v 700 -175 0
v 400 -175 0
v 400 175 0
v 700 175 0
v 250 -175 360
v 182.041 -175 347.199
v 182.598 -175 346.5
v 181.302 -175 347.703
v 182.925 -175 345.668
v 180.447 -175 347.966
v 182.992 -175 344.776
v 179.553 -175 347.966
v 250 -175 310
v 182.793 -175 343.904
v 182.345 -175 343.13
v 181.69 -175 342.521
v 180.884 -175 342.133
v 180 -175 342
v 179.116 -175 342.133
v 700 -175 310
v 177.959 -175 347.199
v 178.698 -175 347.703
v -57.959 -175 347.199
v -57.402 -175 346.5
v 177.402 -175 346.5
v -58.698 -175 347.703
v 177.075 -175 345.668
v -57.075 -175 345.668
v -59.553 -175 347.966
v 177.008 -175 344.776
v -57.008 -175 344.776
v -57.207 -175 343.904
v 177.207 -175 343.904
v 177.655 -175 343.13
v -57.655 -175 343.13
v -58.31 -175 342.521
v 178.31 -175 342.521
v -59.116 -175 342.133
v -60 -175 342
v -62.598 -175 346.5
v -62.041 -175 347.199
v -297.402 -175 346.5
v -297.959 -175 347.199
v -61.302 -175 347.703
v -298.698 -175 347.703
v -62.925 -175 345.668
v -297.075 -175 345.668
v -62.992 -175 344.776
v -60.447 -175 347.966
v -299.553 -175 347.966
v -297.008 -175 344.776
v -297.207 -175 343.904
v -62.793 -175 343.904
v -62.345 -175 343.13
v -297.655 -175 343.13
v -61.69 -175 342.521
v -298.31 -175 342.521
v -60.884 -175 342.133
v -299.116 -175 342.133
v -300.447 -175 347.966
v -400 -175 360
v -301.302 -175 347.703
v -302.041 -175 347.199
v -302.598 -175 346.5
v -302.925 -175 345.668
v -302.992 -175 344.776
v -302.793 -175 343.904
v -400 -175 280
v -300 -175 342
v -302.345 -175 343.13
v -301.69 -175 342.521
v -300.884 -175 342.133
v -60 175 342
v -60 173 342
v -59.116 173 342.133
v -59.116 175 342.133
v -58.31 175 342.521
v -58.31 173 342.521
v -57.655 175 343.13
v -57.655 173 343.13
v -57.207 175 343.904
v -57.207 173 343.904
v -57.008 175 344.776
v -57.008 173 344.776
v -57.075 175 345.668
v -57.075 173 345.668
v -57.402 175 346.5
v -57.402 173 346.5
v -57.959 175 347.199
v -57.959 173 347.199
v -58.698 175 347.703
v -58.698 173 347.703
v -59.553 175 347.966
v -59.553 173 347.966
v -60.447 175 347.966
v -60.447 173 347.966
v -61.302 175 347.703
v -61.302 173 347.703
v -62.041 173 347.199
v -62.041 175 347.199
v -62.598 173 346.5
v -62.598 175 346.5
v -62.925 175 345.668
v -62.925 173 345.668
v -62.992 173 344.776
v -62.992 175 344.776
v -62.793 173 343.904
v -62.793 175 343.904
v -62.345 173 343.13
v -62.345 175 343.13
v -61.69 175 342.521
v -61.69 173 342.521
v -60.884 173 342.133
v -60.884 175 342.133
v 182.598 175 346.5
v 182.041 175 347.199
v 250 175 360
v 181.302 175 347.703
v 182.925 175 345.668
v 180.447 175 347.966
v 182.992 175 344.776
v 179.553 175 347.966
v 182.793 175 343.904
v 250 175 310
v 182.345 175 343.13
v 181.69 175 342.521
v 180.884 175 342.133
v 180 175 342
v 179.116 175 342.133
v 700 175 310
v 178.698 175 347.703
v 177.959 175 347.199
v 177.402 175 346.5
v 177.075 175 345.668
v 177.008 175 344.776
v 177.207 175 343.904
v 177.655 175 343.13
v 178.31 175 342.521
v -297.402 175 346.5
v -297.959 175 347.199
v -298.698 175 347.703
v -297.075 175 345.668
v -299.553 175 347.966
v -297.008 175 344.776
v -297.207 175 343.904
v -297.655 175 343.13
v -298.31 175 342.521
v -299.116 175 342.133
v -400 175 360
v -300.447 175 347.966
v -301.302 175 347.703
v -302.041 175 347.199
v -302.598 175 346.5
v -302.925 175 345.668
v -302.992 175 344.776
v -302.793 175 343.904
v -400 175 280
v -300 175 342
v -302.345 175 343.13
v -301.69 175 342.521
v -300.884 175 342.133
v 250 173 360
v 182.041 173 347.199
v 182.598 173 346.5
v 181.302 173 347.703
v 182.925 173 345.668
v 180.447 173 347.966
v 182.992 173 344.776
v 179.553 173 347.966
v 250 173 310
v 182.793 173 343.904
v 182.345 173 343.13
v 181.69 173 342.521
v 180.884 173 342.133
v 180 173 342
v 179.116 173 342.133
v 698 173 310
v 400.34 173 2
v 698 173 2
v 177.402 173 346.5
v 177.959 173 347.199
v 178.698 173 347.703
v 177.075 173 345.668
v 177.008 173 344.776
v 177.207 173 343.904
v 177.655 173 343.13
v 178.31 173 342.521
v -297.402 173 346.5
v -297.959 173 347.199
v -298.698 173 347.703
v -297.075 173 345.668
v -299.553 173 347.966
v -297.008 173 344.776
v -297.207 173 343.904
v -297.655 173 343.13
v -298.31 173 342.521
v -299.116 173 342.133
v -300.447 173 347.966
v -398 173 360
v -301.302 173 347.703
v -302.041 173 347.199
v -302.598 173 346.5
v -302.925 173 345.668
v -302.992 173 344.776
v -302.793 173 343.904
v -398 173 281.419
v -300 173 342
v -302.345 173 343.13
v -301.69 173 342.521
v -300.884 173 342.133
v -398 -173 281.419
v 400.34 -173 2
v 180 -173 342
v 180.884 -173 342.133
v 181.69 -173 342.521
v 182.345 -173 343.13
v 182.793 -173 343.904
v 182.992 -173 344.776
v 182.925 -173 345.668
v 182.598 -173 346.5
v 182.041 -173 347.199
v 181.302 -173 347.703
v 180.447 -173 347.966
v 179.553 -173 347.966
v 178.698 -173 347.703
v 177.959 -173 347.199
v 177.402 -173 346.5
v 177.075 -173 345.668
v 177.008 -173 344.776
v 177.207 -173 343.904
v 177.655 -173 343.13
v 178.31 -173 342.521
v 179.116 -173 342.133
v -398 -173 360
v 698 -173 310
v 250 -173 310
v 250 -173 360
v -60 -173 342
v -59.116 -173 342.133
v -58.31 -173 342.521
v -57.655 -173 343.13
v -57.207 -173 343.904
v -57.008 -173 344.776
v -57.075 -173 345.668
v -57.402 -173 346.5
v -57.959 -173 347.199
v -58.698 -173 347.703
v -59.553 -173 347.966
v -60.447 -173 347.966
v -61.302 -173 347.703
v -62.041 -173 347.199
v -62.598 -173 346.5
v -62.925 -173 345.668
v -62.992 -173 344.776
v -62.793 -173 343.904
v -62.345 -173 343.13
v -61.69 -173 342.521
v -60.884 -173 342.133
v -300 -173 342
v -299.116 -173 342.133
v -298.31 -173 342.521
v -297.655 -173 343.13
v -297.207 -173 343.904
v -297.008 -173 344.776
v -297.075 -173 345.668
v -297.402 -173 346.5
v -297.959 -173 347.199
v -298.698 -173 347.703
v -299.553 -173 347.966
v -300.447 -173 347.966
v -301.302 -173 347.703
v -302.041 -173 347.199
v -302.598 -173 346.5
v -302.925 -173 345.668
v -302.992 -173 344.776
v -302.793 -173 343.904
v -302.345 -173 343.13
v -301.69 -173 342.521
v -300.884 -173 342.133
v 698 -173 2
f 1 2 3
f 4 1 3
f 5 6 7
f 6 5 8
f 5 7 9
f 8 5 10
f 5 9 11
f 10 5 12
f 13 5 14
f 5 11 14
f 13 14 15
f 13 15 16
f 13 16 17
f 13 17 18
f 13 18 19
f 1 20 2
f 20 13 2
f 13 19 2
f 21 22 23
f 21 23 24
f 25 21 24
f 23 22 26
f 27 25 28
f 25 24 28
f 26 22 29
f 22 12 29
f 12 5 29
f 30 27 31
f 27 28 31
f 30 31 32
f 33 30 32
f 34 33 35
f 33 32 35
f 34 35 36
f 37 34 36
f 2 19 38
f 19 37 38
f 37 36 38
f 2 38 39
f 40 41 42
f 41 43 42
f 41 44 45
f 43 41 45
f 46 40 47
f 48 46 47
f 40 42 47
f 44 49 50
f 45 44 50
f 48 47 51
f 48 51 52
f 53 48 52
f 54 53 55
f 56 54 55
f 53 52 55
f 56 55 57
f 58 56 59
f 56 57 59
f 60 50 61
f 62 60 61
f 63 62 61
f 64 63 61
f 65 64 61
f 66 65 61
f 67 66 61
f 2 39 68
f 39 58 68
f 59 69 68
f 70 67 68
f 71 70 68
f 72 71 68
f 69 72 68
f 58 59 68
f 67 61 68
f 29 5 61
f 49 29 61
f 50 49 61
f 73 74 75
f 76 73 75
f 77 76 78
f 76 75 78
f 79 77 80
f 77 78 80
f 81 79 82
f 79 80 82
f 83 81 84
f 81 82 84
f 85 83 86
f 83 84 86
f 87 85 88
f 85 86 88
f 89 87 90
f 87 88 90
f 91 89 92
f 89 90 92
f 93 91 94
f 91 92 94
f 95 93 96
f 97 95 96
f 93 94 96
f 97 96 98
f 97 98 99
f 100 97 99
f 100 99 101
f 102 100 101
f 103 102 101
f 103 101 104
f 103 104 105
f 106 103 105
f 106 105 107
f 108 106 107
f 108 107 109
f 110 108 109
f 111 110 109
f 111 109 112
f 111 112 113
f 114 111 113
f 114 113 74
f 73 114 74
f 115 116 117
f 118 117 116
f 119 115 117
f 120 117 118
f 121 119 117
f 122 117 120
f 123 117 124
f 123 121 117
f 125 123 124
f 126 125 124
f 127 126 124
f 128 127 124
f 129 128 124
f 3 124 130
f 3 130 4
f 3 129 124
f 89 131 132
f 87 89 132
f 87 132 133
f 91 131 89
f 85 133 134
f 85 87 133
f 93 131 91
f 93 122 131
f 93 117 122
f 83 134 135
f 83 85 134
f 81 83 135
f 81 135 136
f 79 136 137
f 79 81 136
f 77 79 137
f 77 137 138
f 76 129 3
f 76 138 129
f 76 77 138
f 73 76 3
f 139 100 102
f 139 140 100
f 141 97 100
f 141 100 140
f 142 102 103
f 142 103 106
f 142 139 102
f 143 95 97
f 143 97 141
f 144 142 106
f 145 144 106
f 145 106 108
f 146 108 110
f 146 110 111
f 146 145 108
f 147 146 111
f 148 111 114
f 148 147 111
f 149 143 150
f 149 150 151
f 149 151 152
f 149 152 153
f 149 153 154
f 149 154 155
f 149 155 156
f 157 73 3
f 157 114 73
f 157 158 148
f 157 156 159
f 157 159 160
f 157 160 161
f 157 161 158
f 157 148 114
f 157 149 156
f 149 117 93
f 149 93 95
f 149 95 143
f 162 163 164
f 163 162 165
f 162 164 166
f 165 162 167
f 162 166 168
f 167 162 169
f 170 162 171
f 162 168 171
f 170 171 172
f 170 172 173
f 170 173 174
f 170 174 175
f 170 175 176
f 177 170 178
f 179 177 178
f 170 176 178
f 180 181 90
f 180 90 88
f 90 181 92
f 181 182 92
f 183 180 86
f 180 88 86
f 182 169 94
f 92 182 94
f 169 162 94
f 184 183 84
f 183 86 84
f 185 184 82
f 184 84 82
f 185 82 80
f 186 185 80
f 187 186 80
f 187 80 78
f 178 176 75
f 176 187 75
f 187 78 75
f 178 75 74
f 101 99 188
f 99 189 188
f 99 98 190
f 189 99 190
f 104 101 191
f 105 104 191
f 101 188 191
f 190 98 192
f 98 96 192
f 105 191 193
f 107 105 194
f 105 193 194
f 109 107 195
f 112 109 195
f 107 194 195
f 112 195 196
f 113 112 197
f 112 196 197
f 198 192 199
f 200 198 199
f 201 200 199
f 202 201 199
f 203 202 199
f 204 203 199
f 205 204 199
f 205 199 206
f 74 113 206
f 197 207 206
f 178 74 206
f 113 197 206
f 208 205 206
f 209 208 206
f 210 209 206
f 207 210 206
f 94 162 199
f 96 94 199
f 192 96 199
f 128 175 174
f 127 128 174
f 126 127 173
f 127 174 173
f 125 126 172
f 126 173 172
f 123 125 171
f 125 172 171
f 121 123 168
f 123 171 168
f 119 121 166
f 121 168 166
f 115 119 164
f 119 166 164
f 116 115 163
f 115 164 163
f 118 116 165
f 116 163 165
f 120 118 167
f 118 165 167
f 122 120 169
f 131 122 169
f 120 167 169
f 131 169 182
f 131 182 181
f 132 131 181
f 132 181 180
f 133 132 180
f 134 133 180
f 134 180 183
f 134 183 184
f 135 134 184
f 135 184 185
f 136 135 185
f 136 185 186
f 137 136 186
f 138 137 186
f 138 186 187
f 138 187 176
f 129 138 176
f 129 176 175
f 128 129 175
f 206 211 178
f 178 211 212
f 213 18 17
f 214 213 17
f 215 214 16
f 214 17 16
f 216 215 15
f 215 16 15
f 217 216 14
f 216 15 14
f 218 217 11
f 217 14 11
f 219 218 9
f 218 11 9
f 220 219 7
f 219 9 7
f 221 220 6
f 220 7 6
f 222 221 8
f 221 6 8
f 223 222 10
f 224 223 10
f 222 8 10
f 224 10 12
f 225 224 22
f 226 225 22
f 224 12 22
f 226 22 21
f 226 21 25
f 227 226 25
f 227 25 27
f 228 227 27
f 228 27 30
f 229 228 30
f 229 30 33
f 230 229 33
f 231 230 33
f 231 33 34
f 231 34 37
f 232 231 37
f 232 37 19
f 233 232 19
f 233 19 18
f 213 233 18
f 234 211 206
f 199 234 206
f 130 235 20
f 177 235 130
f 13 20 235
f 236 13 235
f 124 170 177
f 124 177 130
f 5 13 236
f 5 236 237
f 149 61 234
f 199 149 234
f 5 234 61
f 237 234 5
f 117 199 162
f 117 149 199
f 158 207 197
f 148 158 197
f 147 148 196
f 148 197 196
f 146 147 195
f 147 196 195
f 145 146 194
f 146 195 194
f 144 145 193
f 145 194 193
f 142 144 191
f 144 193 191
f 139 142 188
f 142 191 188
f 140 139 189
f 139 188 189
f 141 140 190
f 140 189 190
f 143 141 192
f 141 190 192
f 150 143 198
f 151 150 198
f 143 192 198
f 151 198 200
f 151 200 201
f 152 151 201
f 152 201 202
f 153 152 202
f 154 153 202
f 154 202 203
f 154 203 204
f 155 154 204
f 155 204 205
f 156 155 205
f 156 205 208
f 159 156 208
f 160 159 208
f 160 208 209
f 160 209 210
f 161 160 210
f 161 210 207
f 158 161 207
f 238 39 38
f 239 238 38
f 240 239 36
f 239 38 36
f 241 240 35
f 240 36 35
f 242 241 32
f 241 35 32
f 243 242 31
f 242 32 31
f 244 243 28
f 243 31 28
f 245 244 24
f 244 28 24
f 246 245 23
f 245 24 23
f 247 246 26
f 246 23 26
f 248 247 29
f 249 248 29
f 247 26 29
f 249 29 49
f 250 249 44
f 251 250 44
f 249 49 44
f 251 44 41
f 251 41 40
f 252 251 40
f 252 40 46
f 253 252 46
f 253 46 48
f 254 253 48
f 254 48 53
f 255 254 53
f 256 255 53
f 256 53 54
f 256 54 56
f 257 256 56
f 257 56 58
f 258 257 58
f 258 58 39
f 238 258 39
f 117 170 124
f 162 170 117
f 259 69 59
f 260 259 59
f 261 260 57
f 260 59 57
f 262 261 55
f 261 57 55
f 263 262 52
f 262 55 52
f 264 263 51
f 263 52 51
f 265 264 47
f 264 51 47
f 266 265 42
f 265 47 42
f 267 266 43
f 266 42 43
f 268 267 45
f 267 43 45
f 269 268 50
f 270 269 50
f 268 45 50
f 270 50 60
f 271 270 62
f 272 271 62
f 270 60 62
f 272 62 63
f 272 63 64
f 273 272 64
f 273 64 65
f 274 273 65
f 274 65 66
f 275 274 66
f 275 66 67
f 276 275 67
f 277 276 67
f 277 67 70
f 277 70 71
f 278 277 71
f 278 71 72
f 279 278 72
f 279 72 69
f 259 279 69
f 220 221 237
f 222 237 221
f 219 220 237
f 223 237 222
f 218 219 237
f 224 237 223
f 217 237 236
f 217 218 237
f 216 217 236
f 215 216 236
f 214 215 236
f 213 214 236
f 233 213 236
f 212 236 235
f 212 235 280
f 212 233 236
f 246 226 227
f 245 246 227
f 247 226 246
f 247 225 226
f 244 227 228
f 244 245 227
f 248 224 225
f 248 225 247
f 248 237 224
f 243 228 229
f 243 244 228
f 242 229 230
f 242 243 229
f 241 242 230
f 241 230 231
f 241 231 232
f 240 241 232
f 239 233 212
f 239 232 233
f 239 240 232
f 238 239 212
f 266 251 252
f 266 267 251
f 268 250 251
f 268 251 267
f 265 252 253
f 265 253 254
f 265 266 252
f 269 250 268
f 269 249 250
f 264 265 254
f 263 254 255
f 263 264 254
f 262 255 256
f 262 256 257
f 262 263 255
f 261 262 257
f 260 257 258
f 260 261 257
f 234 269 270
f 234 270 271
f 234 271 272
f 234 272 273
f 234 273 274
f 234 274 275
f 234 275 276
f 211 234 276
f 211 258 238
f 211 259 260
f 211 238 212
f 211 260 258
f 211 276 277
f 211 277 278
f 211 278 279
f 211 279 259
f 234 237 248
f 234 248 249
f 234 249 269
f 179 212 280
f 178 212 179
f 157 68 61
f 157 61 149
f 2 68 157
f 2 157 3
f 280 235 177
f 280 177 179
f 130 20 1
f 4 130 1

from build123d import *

# Parameters (mm, degrees)
SKETCH7_W           = 800
SKETCH7_H           = 350
BOSS_EXTRUDE1_DEPTH = 360
CUT_EXTRUDE1_DEPTH  = 642.950153828
SKETCH10_W          = 150
SKETCH10_H          = 50
CUT_EXTRUDE3_DEPTH  = 642.950153828
SKETCH11_W          = 310
SKETCH11_H          = 350
BOSS_EXTRUDE2_DEPTH = 300
SHELL3_T            = -2
SKETCH12_R          = 3
CUT_EXTRUDE4_DEPTH  = 862.452262171


with BuildPart() as part:
    # Sketch7 → Boss-Extrude1 (new body)
    with BuildSketch(Plane.XY):
        Rectangle(SKETCH7_W, SKETCH7_H)
    extrude(amount=BOSS_EXTRUDE1_DEPTH)

    # Sketch8 → Cut-Extrude1 (cut, through all)
    with BuildSketch(Plane.XZ.offset(175)):
        Polygon((-400, 280), (400, 0), (-400, 0), align=None)
    extrude(amount=-CUT_EXTRUDE1_DEPTH, mode=Mode.SUBTRACT)

    # Sketch10 → Cut-Extrude3 (cut, through all)
    with BuildSketch(Plane.XZ.offset(175)):
        with Locations((325, 335)):
            Rectangle(SKETCH10_W, SKETCH10_H)
    extrude(amount=-CUT_EXTRUDE3_DEPTH, mode=Mode.SUBTRACT)

    # Sketch11 → Boss-Extrude2 (add)
    with BuildSketch(Plane(origin=(400, 0, 0), x_dir=(0, 0, -1), z_dir=(1, 0, 0))):
        with Locations((-155, 0)):
            Rectangle(SKETCH11_W, SKETCH11_H)
    extrude(amount=BOSS_EXTRUDE2_DEPTH)

    # Shell3
    shell3_openings = [part.faces().sort_by_distance(p)[0] for p in [
        (-75, 0, 360),
        (475, 0, 310),
        (250, 0, 335),
    ]]
    offset(amount=SHELL3_T, openings=shell3_openings, kind=Kind.INTERSECTION)

    # Sketch12 → Cut-Extrude4 (cut, through all)
    with BuildSketch(Plane.XZ.offset(175)):
        with Locations(Location((-300, 345, 0), (0, 0, 270))):
            Circle(SKETCH12_R)
        with Locations(Location((-60, 345, 0), (0, 0, 270))):
            Circle(SKETCH12_R)
        with Locations(Location((180, 345, 0), (0, 0, 270))):
            Circle(SKETCH12_R)
    extrude(amount=-CUT_EXTRUDE4_DEPTH, mode=Mode.SUBTRACT)


solid = part.part
